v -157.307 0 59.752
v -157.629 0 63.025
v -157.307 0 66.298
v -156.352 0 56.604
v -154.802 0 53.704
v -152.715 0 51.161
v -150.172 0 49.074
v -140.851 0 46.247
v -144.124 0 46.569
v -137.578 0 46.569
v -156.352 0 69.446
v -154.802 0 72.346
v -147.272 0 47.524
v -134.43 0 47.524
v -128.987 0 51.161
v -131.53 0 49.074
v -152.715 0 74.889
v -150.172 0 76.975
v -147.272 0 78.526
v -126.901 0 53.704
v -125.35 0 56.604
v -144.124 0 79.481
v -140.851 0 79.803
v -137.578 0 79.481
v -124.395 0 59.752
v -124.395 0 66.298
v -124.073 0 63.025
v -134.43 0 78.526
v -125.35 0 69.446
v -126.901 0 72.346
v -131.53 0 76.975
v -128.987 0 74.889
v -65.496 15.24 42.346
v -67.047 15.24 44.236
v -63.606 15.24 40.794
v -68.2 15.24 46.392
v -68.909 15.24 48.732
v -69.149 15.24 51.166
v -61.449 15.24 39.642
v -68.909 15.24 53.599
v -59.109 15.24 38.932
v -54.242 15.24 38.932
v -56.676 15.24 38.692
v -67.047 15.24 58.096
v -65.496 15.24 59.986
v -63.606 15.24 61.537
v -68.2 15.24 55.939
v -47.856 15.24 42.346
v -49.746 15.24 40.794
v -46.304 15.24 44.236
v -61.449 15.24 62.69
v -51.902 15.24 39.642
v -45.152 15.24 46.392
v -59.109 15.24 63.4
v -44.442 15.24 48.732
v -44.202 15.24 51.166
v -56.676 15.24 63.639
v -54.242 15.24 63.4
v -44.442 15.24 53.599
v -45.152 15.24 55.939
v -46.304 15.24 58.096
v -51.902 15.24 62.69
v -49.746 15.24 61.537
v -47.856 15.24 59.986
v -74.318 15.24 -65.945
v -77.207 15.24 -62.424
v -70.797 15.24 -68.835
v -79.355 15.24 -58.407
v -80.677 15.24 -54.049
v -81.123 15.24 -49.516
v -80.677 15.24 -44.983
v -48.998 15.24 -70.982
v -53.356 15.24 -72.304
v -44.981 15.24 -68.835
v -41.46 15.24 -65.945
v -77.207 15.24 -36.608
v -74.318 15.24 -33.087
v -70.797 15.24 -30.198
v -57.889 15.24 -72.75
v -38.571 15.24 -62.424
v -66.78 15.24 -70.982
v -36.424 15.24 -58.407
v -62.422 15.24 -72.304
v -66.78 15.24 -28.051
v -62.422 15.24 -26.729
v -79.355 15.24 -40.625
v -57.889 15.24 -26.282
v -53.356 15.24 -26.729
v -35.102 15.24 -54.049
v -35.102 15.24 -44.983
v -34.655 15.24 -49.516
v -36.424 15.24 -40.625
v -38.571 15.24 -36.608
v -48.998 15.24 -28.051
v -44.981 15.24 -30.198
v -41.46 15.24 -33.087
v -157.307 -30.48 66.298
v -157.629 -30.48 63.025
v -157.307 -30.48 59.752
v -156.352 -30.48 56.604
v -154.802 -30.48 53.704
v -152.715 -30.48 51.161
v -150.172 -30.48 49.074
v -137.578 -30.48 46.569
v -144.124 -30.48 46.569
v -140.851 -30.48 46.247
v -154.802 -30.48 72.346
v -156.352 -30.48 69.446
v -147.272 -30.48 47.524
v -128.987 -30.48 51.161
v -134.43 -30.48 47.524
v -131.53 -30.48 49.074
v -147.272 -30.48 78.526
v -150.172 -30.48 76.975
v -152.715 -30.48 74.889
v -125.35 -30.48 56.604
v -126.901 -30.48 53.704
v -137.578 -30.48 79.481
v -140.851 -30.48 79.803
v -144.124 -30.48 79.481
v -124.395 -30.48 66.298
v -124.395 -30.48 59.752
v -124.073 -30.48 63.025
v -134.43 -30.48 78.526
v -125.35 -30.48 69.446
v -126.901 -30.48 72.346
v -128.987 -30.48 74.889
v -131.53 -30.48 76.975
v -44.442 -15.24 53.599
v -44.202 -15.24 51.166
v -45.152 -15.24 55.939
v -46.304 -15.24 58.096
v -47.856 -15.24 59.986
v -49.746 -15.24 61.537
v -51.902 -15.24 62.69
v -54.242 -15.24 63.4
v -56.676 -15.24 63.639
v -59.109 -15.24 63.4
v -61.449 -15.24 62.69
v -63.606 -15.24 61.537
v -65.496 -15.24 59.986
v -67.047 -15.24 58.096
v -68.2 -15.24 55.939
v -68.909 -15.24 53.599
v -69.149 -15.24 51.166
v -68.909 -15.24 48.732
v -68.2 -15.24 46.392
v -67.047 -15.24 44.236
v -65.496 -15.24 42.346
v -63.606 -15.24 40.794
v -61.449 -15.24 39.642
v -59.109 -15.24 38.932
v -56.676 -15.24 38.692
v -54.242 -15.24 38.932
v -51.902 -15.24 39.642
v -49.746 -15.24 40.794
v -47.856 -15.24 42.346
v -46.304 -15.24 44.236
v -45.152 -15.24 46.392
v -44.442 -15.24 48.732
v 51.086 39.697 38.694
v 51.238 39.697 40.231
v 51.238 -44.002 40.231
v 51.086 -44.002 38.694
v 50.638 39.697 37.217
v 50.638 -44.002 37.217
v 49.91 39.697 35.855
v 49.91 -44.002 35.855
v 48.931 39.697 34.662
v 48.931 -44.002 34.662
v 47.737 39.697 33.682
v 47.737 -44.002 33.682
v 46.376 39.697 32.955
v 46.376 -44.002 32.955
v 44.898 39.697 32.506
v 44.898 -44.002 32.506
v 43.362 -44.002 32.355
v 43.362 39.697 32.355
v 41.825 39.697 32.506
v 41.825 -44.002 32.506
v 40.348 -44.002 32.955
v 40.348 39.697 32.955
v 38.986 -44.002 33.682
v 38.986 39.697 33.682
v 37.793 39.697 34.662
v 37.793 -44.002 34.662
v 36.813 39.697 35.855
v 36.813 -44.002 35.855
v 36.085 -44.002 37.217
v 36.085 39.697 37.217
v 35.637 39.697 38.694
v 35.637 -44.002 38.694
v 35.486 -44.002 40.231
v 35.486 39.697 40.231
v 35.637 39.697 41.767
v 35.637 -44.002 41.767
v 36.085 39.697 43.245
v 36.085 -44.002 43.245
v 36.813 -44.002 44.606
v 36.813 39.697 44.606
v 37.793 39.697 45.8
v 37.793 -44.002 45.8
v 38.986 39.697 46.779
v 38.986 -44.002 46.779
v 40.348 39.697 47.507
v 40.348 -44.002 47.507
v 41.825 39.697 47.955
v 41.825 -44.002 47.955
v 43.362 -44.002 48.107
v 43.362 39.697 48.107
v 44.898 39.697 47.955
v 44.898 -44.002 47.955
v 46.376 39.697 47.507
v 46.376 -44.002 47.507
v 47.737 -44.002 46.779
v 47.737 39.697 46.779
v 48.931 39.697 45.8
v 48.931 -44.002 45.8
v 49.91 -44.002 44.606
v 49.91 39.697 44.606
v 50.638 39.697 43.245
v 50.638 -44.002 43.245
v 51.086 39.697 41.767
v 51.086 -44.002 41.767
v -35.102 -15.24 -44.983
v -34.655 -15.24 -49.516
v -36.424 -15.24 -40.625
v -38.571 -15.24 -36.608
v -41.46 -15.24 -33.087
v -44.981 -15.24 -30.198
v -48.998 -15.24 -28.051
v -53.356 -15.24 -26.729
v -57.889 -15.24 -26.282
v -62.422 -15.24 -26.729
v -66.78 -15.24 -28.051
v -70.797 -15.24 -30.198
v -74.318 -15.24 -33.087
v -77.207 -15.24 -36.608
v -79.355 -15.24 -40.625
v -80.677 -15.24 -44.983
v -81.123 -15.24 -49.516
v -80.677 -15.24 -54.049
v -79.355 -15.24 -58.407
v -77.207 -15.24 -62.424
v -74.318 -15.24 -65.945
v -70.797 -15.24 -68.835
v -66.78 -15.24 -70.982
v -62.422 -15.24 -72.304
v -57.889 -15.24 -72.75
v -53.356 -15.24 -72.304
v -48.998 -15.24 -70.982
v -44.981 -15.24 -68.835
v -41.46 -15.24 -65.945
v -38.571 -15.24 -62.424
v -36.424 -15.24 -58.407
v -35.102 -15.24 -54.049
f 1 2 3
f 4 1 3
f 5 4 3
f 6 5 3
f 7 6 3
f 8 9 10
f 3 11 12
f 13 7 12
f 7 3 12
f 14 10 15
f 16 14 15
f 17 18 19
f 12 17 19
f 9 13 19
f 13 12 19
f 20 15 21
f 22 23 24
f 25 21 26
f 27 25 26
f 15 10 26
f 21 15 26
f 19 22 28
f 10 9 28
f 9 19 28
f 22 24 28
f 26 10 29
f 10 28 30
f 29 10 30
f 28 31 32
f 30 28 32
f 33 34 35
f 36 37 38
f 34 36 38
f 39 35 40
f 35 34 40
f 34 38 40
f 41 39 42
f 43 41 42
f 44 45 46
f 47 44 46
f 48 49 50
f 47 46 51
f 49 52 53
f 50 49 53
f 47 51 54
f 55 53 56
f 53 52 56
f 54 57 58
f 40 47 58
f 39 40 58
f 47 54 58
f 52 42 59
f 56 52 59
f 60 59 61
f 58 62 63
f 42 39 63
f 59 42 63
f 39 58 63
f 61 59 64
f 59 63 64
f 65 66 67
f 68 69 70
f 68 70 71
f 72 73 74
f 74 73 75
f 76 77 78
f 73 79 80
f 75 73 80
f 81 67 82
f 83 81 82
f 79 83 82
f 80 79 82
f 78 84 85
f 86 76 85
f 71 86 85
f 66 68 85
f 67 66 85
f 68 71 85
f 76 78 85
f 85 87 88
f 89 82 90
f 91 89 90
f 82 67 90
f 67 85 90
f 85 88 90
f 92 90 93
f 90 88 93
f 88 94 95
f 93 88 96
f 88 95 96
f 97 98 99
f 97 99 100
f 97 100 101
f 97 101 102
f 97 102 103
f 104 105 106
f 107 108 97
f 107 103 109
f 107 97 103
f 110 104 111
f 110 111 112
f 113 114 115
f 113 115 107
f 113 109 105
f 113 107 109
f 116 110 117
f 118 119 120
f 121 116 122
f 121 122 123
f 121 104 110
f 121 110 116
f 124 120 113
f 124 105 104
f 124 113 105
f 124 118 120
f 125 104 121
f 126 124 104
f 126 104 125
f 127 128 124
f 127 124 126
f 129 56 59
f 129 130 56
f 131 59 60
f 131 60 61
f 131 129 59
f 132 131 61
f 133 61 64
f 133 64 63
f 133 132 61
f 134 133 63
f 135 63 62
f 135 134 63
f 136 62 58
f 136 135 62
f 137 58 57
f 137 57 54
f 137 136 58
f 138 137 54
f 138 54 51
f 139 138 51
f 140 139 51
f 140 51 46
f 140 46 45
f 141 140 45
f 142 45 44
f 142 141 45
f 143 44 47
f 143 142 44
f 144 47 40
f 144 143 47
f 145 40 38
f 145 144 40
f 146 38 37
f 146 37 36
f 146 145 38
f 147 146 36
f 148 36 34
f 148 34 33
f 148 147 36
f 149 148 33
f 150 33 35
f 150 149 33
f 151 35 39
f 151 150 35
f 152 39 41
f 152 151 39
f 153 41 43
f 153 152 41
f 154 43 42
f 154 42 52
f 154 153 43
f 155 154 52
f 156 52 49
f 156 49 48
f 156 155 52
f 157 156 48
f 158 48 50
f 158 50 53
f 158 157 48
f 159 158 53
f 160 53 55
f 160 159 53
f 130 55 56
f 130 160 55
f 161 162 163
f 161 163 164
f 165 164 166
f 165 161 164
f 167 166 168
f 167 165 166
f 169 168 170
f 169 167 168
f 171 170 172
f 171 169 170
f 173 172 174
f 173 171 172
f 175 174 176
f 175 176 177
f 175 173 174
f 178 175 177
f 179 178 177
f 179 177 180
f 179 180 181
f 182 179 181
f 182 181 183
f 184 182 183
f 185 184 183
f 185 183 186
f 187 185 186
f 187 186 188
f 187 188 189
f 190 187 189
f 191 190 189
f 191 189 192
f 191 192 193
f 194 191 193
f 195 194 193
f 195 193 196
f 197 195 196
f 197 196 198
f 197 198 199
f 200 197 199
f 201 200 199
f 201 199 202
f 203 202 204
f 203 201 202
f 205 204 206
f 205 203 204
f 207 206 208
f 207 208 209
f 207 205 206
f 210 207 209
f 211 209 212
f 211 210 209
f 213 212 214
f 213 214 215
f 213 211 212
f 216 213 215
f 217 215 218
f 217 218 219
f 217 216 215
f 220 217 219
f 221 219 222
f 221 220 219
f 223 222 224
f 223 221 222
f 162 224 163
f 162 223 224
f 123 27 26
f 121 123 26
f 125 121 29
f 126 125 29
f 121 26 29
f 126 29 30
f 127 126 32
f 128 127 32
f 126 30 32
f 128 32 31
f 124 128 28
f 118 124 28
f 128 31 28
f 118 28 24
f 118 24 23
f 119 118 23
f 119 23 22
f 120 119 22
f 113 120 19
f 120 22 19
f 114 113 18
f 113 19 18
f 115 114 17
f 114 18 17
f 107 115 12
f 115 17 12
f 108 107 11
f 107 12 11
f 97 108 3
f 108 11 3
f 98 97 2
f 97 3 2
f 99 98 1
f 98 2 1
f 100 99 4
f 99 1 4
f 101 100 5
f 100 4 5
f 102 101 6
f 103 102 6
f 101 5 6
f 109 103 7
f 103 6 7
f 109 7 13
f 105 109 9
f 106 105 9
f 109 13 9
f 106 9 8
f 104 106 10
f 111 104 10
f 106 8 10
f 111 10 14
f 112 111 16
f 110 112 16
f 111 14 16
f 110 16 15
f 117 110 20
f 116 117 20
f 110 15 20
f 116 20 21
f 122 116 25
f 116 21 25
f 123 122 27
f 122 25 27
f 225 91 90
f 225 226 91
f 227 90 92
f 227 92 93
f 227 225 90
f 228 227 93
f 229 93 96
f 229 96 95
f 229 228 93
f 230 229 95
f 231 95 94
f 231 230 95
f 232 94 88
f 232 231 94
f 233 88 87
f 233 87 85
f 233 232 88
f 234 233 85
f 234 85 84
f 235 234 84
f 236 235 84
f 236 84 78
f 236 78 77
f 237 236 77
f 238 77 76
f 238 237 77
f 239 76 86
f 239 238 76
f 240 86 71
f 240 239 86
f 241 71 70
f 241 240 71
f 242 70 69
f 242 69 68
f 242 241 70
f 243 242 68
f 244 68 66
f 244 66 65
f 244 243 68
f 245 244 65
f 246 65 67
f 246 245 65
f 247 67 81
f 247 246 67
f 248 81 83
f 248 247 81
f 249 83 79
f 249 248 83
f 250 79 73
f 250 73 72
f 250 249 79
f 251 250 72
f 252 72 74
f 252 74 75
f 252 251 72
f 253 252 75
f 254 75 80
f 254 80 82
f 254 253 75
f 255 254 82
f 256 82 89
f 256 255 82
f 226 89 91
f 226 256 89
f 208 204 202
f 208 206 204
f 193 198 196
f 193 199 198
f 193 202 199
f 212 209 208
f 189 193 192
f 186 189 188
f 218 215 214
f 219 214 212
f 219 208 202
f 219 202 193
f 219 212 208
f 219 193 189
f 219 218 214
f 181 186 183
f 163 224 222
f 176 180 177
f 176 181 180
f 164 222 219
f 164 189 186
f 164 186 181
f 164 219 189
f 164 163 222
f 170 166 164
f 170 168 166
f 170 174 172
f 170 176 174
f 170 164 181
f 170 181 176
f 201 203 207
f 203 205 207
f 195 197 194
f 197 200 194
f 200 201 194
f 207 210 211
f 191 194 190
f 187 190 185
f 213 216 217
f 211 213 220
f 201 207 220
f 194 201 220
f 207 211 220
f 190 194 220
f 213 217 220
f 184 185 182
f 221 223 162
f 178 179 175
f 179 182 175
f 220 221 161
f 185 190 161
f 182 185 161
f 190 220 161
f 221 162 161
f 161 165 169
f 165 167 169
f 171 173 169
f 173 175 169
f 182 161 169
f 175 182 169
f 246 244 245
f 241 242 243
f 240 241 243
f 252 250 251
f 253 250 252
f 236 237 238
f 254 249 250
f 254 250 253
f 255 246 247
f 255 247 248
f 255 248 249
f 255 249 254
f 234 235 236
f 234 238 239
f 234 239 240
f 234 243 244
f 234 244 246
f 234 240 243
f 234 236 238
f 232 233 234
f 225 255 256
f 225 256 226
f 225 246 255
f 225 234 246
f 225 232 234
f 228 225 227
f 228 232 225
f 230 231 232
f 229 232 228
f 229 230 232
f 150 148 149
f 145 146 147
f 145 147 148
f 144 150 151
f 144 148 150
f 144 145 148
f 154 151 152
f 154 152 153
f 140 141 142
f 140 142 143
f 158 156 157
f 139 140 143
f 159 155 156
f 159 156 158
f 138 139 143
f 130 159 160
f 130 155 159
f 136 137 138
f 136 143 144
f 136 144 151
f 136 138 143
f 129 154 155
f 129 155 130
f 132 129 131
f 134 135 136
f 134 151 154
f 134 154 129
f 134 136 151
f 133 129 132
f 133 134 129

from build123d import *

# Parameters (mm, degrees)
F0_R     = 12.473511
F1_DEPTH = 15.24
F0_R_2   = 7.875851
F4_R     = 16.778104
F5_DEPTH = 30.48
F6_R     = 23.234001
F7_DEPTH = 15.24


with BuildPart() as f1:
    # F0 (on Front) → F1 (new body, symmetric)
    with BuildSketch(Plane.XZ):
        with Locations((-56.675613, 51.165804)):
            Circle(F0_R)
    extrude(amount=F1_DEPTH, both=True)


with BuildPart() as f3:
    # F3: sweep along a path in F2
    with BuildLine(Plane.XY) as f3_path:
        Line((-15.159276, -44.00165), (-15.159276, 39.697319))
    # F0 (on Front) → F3 (sweep)
    with BuildSketch(Plane.XZ):
        with Locations((43.361761, 40.230881)):
            Circle(F0_R_2)
    sweep(path=f3_path.line)


with BuildPart() as f5:
    # F4 (on Front) → F5 (new body)
    with BuildSketch(Plane.XZ):
        with Locations((-140.851051, 63.024946)):
            Circle(F4_R)
    extrude(amount=F5_DEPTH)


with BuildPart() as f7:
    # F6 (on Front) → F7 (new body, symmetric)
    with BuildSketch(Plane.XZ):
        with Locations((-57.889093, -49.516145)):
            Circle(F6_R)
    extrude(amount=F7_DEPTH, both=True)


solid = Compound([f1.part, f3.part, f5.part, f7.part])
